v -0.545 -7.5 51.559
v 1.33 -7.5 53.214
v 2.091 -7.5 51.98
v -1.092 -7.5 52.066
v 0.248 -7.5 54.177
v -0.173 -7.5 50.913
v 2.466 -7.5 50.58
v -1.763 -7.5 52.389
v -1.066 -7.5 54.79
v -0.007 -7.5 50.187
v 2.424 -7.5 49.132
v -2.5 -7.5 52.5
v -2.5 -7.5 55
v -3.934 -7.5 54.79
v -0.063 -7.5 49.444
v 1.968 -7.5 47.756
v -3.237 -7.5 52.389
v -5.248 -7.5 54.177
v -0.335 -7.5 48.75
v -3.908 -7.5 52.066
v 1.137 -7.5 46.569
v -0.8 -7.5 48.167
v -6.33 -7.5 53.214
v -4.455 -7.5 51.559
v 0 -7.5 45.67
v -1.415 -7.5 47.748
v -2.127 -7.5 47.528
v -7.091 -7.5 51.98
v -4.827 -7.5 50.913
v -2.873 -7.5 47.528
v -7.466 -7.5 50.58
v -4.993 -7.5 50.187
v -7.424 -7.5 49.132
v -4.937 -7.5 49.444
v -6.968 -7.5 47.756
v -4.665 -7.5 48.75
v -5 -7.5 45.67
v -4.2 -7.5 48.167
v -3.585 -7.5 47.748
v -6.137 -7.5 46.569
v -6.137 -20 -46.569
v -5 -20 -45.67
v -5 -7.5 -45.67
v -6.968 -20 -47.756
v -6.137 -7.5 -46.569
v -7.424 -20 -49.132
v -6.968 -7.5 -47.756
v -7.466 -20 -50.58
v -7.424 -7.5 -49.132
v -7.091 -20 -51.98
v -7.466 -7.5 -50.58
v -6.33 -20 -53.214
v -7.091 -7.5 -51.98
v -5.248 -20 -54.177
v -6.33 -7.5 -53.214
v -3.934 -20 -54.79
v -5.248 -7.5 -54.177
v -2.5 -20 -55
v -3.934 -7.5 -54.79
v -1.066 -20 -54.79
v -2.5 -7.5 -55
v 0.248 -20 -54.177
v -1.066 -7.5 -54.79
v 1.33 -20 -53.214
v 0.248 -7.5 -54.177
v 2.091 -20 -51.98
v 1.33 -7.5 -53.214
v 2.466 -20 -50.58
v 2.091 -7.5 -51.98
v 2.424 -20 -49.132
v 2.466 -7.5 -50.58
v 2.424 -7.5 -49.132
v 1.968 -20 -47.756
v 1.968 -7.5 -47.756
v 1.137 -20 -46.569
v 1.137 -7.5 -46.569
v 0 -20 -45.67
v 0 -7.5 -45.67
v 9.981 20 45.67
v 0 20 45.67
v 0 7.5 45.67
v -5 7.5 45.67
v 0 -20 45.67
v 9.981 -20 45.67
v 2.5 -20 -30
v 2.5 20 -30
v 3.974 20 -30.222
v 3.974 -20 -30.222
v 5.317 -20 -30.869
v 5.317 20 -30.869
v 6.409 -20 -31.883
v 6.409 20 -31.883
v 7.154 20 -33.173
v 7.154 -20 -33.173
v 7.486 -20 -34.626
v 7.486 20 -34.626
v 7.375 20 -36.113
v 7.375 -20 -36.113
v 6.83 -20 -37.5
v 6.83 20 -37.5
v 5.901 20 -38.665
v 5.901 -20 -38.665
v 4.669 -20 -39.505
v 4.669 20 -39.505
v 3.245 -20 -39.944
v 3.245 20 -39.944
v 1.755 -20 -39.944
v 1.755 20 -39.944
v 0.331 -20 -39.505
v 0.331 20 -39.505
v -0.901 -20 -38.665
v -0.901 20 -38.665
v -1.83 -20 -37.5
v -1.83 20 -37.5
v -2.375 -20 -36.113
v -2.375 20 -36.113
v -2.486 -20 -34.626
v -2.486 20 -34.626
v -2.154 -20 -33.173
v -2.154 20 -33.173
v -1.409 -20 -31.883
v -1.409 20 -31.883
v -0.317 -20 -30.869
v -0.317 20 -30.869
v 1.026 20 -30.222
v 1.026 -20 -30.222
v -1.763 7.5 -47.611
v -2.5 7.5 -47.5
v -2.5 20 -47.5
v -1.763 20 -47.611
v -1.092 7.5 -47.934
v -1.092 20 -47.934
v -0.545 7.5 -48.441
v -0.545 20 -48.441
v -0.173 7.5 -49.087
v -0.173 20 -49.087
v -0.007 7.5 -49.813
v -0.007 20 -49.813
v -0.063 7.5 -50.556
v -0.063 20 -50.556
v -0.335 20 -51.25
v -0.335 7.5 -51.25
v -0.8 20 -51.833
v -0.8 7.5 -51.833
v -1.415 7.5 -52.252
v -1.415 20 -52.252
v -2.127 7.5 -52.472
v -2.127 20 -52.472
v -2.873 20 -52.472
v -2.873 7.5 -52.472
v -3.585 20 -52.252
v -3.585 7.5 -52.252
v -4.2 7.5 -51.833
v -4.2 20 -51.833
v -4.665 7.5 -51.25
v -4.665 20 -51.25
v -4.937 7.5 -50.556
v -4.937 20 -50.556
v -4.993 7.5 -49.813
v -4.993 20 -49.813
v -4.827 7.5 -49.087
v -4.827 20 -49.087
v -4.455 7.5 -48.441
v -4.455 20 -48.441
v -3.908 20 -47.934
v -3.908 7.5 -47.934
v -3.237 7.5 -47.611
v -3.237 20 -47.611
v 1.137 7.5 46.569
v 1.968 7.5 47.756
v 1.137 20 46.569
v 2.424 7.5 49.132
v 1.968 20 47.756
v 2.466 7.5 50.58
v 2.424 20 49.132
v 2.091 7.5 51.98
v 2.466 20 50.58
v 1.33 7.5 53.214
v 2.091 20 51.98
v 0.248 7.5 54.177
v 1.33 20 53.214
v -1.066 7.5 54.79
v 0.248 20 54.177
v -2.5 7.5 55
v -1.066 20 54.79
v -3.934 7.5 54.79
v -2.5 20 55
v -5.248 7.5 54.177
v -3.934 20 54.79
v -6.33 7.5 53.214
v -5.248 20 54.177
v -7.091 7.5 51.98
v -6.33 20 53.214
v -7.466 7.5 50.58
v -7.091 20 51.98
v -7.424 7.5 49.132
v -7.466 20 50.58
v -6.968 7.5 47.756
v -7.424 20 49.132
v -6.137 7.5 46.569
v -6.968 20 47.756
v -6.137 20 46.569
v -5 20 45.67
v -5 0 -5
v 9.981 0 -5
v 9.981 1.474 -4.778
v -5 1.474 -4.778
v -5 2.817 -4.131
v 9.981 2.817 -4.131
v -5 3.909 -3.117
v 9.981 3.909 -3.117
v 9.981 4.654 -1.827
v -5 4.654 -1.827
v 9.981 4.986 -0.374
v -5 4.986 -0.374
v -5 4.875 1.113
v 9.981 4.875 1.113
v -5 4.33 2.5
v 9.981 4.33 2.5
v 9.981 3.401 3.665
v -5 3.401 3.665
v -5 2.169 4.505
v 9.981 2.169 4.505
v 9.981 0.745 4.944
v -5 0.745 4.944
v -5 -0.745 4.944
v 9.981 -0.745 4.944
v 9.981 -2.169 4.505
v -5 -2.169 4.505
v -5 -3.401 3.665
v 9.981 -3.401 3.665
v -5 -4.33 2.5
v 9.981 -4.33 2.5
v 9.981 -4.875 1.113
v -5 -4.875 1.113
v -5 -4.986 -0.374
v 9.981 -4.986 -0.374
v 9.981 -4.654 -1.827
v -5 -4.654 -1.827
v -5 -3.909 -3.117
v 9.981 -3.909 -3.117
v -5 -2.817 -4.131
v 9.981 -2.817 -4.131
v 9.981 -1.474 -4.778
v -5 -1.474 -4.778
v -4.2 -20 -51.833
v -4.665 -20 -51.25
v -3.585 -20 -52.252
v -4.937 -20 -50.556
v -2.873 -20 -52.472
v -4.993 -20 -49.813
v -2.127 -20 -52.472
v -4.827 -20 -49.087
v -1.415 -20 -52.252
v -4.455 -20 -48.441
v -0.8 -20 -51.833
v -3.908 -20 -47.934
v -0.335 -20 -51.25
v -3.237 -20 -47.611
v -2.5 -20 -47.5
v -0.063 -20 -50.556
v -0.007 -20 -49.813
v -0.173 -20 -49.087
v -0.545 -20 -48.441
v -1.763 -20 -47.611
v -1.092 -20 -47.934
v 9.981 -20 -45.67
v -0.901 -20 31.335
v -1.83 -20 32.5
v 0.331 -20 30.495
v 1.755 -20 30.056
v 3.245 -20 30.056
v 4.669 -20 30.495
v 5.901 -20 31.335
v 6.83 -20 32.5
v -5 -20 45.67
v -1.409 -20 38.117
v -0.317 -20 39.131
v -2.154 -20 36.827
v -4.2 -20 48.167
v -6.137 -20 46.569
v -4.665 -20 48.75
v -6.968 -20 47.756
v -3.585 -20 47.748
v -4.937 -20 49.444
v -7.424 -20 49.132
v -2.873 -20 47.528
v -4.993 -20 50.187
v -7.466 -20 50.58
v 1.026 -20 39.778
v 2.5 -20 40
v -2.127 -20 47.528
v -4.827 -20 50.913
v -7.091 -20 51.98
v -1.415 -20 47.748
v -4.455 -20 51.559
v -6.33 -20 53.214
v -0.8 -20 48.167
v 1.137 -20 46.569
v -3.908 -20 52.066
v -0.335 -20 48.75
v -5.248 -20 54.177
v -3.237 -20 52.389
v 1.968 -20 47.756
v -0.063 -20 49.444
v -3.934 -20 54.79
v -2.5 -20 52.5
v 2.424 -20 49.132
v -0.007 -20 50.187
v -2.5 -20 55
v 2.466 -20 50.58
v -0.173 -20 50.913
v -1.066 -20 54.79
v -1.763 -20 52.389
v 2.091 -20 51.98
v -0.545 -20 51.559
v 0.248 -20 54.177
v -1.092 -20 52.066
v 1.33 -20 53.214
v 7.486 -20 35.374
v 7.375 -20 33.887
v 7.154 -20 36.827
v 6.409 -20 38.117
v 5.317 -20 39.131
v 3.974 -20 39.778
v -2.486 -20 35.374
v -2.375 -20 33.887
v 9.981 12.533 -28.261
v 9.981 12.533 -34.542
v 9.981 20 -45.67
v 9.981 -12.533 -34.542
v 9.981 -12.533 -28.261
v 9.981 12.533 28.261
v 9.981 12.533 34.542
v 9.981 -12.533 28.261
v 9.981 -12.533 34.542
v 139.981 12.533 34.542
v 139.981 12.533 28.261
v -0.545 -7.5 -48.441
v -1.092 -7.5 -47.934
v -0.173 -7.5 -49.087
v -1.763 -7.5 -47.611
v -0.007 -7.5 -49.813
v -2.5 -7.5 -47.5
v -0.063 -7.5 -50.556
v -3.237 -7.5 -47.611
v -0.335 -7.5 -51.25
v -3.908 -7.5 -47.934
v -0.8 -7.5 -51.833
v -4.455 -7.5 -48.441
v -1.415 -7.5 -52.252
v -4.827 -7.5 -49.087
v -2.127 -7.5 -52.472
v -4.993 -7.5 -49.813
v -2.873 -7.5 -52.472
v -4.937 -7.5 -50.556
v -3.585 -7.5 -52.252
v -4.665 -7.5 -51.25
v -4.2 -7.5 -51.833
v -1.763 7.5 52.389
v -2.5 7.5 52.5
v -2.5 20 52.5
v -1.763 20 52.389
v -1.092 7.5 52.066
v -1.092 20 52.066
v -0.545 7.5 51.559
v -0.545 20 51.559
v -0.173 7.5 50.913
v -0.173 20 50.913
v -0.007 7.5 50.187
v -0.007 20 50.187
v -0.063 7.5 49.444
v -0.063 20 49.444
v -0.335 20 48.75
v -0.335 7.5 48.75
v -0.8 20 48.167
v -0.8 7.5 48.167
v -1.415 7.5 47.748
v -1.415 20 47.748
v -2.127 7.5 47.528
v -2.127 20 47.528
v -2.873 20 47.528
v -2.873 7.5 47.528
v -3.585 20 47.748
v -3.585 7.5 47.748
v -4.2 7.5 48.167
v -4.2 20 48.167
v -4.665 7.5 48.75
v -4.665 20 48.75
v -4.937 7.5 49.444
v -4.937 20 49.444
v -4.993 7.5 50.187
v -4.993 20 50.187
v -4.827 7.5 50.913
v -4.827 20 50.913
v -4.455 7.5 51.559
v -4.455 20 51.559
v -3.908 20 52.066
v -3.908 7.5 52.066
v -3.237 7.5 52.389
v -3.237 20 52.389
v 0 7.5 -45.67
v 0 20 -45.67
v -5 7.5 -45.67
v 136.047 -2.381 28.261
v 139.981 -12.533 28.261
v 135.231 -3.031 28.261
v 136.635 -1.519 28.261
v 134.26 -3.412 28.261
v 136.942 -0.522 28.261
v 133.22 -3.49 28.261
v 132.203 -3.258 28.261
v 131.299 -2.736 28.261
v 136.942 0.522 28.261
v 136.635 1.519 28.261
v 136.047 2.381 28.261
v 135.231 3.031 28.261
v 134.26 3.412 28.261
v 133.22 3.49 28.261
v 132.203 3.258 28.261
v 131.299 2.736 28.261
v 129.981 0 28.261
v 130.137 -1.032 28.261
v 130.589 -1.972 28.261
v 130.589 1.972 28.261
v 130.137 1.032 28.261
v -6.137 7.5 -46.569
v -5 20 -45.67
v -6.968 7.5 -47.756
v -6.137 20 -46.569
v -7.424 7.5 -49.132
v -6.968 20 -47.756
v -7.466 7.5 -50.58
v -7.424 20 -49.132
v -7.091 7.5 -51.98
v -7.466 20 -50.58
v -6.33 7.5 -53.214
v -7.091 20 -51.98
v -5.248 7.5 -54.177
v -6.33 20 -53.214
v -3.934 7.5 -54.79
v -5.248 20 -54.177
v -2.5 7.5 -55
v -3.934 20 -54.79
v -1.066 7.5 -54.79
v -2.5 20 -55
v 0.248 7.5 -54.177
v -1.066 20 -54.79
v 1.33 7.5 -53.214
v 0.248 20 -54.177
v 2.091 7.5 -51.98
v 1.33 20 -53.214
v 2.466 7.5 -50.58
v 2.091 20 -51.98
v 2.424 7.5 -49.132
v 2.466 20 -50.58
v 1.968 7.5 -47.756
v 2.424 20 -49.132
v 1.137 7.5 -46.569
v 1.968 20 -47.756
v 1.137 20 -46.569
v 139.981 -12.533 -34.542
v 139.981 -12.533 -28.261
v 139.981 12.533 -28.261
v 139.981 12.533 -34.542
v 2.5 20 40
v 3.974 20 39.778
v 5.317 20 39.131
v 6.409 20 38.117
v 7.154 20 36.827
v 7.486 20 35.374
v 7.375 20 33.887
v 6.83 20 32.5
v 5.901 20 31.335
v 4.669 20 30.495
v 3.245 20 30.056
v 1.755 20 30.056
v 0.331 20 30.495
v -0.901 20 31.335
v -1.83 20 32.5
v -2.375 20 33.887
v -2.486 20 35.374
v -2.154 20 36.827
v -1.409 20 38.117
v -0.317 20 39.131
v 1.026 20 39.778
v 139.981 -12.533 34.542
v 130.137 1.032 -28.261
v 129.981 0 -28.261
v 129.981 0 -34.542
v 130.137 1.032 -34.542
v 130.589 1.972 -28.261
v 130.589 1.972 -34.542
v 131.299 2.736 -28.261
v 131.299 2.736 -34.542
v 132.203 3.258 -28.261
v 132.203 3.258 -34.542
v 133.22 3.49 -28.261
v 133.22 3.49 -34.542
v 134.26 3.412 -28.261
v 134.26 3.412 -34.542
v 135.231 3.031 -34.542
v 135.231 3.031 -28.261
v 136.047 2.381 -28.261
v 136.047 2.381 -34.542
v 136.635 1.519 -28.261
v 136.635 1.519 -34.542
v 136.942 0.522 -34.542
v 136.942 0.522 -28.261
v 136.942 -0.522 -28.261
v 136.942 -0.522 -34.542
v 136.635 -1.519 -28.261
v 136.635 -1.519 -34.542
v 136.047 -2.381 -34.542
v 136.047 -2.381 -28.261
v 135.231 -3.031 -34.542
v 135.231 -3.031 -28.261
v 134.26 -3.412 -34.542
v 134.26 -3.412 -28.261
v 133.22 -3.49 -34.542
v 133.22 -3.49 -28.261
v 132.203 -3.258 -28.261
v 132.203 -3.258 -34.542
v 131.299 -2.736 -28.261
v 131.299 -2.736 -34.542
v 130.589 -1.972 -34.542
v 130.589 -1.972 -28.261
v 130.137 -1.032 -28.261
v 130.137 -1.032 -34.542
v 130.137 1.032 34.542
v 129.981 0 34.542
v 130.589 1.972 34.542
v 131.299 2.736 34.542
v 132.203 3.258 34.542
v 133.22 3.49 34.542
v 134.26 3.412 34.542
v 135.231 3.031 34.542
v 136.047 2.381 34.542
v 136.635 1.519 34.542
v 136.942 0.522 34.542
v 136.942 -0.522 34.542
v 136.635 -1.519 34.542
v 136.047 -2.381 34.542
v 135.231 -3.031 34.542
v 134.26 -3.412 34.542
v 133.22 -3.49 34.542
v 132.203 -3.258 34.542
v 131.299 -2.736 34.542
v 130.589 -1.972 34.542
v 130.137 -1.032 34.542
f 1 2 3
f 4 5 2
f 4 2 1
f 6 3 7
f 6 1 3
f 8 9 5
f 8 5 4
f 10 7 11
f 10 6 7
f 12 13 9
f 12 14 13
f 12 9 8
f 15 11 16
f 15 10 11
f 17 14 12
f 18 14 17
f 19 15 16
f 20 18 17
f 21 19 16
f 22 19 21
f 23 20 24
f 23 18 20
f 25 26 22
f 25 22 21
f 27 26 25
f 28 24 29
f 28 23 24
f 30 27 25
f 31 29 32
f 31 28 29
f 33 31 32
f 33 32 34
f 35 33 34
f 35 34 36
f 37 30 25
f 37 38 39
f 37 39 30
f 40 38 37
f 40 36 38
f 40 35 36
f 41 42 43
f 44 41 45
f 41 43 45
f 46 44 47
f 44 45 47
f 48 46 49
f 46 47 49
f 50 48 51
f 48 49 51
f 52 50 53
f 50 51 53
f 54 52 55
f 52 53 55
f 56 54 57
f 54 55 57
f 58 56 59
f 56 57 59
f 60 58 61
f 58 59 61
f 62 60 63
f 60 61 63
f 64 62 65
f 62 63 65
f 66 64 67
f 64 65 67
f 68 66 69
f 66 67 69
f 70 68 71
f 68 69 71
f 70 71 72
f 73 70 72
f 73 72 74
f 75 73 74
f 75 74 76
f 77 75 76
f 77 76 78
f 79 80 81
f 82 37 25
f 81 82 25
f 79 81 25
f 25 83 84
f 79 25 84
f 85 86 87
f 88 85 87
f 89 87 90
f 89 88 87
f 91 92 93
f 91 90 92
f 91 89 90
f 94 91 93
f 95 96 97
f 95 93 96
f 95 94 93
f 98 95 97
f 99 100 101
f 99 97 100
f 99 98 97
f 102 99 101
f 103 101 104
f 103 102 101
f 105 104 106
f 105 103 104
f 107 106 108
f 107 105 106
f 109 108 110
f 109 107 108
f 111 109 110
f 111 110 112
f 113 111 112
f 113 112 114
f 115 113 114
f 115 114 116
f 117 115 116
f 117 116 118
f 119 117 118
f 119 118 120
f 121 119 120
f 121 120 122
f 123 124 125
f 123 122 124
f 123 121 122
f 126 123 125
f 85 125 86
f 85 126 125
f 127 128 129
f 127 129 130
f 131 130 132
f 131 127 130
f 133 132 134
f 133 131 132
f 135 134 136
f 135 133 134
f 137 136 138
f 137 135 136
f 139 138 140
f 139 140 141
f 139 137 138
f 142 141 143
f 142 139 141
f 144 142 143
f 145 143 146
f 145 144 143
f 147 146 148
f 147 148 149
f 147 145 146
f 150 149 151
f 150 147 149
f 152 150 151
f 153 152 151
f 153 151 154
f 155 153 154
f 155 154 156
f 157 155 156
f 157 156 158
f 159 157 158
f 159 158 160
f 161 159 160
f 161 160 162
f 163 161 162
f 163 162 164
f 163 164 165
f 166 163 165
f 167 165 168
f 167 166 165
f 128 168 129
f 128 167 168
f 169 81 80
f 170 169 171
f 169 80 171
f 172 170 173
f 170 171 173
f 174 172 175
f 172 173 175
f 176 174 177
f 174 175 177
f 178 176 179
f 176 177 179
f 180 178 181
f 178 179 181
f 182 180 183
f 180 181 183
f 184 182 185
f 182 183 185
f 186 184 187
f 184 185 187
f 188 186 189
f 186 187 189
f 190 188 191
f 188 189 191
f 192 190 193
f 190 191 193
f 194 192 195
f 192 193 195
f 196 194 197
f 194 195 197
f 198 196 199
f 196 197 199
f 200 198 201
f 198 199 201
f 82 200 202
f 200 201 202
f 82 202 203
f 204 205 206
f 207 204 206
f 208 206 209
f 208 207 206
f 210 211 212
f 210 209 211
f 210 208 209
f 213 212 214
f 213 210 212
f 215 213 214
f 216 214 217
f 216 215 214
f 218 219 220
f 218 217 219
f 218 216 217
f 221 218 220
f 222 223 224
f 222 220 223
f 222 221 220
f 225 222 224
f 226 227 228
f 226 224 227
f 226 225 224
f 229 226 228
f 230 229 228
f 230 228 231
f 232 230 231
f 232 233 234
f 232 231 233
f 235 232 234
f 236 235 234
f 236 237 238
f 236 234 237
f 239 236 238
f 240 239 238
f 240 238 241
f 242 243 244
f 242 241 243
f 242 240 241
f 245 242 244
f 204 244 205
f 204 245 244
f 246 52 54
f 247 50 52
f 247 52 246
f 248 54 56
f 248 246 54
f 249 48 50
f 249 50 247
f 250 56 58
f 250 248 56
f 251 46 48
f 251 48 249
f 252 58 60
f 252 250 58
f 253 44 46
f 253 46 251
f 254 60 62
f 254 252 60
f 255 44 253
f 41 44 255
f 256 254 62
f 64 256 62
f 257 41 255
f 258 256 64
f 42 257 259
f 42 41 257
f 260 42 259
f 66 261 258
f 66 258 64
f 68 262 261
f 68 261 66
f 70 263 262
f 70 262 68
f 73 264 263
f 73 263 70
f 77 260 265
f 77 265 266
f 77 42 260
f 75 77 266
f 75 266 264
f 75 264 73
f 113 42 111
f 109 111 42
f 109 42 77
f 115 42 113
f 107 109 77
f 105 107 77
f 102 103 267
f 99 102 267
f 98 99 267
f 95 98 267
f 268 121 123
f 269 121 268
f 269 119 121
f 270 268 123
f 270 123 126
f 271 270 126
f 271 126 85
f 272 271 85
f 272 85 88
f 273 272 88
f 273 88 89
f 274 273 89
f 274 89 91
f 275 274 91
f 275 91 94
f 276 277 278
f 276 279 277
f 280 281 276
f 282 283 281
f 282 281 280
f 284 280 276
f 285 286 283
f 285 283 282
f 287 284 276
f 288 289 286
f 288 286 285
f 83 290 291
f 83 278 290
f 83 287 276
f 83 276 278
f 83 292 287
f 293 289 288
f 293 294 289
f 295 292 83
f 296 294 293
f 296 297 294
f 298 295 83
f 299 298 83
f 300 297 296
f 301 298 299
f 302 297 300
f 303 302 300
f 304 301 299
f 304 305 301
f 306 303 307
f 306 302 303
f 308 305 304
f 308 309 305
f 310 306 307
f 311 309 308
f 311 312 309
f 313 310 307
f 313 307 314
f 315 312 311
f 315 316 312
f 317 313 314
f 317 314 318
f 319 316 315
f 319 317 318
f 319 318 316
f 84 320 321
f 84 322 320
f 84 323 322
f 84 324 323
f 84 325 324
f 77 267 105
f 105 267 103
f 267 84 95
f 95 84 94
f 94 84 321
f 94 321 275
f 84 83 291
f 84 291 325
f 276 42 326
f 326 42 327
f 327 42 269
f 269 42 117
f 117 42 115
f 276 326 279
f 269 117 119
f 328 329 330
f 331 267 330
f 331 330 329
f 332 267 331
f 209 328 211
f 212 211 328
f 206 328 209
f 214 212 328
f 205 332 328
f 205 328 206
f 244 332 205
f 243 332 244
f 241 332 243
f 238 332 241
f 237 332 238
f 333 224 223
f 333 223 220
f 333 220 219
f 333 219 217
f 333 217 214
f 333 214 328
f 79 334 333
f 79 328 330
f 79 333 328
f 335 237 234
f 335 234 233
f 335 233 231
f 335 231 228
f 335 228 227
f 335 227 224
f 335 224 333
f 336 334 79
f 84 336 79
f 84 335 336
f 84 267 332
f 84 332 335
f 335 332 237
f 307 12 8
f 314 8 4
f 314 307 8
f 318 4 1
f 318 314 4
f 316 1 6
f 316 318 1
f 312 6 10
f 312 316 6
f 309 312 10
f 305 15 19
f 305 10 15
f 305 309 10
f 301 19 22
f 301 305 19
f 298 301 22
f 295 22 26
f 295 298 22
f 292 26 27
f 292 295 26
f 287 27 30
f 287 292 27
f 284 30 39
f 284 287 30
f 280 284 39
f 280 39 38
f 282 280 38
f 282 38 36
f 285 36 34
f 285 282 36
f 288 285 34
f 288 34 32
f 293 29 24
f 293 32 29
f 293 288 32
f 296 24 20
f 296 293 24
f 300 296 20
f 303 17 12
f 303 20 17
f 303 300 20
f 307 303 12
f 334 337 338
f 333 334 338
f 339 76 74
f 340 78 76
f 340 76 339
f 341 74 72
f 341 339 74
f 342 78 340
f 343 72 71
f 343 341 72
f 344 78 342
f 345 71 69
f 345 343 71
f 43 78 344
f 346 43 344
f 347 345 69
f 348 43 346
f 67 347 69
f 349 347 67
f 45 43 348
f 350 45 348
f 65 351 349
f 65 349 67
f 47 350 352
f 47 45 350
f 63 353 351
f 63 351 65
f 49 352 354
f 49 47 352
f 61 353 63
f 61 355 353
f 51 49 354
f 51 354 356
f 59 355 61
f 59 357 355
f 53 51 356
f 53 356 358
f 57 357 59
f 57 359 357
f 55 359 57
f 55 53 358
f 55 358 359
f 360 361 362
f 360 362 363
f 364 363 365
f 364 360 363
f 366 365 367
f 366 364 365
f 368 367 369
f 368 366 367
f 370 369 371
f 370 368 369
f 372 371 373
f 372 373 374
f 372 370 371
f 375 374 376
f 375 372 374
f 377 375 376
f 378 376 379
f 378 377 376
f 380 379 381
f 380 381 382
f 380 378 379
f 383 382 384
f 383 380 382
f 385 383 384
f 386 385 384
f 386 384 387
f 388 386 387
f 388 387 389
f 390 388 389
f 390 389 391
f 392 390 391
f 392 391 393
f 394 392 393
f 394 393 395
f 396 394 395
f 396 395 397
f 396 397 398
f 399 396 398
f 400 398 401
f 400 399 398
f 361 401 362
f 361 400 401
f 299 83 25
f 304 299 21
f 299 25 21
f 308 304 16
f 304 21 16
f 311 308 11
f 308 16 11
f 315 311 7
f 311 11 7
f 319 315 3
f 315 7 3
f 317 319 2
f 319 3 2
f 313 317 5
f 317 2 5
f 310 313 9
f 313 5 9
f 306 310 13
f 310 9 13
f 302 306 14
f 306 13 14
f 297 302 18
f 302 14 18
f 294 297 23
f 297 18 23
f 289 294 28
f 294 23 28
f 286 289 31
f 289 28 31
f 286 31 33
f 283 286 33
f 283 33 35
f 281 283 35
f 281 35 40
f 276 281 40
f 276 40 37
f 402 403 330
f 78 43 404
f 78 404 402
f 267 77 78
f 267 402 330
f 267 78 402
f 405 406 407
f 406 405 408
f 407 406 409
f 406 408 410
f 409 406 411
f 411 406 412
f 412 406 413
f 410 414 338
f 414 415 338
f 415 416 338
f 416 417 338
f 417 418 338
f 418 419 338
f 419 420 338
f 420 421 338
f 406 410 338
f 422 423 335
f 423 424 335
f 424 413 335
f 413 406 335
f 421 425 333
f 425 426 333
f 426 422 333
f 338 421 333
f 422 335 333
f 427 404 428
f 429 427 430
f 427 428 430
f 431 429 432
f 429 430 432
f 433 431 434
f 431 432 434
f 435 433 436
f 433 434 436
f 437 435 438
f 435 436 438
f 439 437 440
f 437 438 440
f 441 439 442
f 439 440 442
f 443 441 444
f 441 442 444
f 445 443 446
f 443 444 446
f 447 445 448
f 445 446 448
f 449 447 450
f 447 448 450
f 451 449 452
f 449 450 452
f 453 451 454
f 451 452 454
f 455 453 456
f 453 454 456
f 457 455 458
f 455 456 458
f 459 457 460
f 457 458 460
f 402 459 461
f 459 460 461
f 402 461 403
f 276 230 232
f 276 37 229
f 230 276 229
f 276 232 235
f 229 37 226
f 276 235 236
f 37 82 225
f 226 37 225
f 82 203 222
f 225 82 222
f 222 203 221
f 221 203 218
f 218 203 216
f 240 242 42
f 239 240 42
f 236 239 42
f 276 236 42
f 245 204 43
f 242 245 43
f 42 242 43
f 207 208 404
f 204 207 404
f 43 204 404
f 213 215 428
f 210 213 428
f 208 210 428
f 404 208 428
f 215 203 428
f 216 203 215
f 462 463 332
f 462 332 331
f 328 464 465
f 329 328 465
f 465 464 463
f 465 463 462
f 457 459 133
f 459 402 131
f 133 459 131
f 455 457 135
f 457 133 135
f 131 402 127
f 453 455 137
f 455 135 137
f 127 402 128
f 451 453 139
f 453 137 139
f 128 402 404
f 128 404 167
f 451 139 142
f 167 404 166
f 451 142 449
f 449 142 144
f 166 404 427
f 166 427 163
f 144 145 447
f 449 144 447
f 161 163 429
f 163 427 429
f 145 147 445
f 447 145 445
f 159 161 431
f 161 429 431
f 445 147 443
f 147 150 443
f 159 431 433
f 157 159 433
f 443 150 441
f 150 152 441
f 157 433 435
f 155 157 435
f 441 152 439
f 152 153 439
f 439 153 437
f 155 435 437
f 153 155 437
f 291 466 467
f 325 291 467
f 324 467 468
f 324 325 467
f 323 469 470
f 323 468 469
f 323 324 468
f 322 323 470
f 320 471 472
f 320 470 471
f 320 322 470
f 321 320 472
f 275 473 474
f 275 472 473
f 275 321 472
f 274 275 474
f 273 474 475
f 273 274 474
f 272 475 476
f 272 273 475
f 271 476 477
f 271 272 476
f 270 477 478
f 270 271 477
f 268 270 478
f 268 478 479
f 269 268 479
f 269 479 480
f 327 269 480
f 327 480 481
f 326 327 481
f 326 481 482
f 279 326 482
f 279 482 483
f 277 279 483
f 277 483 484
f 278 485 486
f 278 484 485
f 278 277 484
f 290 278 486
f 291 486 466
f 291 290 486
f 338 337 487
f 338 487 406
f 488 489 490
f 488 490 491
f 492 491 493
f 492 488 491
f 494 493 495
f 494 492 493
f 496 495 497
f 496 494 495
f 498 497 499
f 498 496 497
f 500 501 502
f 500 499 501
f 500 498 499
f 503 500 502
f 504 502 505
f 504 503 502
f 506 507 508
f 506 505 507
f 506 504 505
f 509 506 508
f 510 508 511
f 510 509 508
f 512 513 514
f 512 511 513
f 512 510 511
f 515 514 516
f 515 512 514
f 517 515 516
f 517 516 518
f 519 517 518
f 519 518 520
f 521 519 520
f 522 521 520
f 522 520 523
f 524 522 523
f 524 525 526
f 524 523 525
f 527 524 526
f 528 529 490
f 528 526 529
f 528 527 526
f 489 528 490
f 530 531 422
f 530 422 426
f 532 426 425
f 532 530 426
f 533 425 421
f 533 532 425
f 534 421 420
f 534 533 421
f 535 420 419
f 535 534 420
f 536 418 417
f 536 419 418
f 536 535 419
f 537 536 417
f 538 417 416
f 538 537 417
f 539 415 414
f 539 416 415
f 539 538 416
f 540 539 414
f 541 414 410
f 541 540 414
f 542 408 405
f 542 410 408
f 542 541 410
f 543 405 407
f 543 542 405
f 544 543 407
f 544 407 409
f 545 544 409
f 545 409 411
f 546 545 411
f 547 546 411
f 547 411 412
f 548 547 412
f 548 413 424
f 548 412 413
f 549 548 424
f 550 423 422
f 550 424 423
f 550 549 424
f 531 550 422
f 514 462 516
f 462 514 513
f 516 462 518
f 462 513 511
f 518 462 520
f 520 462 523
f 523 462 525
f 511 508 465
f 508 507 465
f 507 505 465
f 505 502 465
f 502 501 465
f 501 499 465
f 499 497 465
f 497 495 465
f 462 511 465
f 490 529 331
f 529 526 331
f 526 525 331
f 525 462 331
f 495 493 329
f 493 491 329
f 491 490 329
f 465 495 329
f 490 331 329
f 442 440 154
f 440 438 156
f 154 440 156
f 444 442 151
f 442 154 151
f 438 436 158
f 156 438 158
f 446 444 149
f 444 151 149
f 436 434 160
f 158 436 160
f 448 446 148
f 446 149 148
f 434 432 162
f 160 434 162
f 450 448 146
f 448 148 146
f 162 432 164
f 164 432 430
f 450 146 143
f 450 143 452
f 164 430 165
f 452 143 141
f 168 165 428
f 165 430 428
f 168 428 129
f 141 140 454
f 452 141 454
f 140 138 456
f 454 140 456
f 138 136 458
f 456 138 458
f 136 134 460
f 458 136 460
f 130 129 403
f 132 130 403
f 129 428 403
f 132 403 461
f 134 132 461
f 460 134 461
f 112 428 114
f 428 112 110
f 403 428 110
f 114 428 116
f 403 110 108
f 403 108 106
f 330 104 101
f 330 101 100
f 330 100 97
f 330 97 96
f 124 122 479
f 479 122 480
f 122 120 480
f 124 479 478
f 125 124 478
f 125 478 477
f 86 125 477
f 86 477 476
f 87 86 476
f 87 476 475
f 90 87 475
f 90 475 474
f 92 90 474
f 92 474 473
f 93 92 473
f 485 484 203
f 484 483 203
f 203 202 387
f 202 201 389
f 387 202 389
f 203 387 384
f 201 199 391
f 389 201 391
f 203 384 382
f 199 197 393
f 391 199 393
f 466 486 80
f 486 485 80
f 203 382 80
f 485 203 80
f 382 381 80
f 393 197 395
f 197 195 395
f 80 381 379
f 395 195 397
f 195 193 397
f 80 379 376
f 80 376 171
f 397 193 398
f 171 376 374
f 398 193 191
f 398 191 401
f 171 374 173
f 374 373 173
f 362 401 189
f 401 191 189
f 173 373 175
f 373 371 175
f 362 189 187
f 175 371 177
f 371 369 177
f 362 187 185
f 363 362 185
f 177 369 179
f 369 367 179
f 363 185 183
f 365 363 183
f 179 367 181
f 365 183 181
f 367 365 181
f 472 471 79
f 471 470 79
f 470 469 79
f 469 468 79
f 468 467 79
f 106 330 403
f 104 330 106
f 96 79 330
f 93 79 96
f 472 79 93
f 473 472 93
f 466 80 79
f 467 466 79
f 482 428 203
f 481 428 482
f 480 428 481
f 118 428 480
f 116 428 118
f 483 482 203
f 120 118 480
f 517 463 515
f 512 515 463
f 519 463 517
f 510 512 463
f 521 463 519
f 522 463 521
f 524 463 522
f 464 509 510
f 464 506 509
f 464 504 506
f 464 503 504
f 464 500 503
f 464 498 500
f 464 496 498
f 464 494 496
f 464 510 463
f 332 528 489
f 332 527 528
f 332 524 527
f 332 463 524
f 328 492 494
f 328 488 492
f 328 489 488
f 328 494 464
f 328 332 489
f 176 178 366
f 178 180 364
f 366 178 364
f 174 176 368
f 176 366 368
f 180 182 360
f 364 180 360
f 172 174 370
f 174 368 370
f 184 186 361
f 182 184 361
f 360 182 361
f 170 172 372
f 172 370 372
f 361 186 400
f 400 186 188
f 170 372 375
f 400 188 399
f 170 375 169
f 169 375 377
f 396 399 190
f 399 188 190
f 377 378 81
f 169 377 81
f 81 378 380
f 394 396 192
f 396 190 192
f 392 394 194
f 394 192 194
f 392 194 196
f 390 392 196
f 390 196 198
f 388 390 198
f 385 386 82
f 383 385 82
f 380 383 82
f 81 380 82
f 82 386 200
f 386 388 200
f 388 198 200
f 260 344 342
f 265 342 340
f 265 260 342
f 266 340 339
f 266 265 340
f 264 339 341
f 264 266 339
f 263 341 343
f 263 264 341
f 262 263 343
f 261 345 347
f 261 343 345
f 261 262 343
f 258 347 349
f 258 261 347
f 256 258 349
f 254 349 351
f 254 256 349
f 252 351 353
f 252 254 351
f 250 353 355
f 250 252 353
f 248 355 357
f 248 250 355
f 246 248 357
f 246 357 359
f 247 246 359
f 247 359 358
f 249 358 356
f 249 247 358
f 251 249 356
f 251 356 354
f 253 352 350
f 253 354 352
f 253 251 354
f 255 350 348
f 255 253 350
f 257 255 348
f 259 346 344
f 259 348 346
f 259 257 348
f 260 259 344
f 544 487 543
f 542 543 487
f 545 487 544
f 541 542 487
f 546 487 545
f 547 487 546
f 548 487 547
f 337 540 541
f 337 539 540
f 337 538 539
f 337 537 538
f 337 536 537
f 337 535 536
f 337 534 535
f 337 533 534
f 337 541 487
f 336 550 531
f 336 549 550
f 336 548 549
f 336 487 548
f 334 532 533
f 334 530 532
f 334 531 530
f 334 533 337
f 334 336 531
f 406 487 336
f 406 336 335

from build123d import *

# Parameters (mm, degrees)
SKETCH2_R               = 2.5
BOSS_EXTRUDE2_DEPTH     = 20
SKETCH6_W               = 9.981195927
SKETCH6_H               = 91.339745962
BOSS_EXTRUDE3_DEPTH     = 40
CUT_EXTRUDE2_DEPTH      = 69.735902352
CUT_EXTRUDE2_DEPTH_BACK = 69.735902352
SKETCH4_R               = 5
CUT_EXTRUDE1_DEPTH      = 60.368546151
CUT_EXTRUDE1_DEPTH_BACK = 60.368546151
SKETCH3_R               = 5
SKETCH3_W               = 9.330127019
SKETCH3_H               = 15
SKETCH7_W               = 6.280786139
SKETCH7_H               = 25.065781514
BOSS_EXTRUDE4_DEPTH     = 130
CUT_EXTRUDE4_DEPTH      = 165.095031026
CUT_EXTRUDE4_DEPTH_BACK = 165.095031026
SKETCH8_R               = 3.5


with BuildPart() as part:
    # Sketch2 → Boss-Extrude2 (new, symmetric)
    with BuildSketch(Plane(origin=(0, 0, 0), x_dir=(1, 0, 0), z_dir=(0, 1, 0))):
        with BuildLine():
            Line((-5, -45.669872981), (-5, 45.669872981))
            ThreePointArc((-5, 45.669872981), (-2.5, 55), (0, 45.669872981))
            Line((0, 45.669872981), (0, -45.669872981))
            ThreePointArc((0, -45.669872981), (-2.5, -55), (-5, -45.669872981))
        make_face()
        with Locations(Location((-2.5, 50, 0), (0, 0, 270))):
            Circle(SKETCH2_R, mode=Mode.SUBTRACT)
        with Locations(Location((-2.5, -50, 0), (0, 0, 270))):
            Circle(SKETCH2_R, mode=Mode.SUBTRACT)
    extrude(amount=BOSS_EXTRUDE2_DEPTH, both=True)

    # Sketch6 → Boss-Extrude3 (add)
    with BuildSketch(Plane.XZ.offset(20)):
        with Locations((4.990597963, 0)):
            Rectangle(SKETCH6_W, SKETCH6_H)
    extrude(amount=-BOSS_EXTRUDE3_DEPTH)

    # Sketch4 → Cut-Extrude2 (cut, two sides: drawn at the far end of the back side and taken through both)
    with BuildSketch(Plane(origin=(0, 20, 0), x_dir=(1, 0, 0), z_dir=(0, 1, 0)).offset(-CUT_EXTRUDE2_DEPTH_BACK)):
        with Locations(Location((2.5, 35, 0), (0, 0, 270))):
            Circle(SKETCH4_R)
        with Locations(Location((2.5, -35, 0), (0, 0, 270))):
            Circle(SKETCH4_R)
    extrude(amount=CUT_EXTRUDE2_DEPTH + CUT_EXTRUDE2_DEPTH_BACK, mode=Mode.SUBTRACT)

    # Sketch3 → Cut-Extrude1 (cut, two sides: drawn at the far end of the back side and taken through both)
    with BuildSketch(Plane(origin=(0, 0, 0), x_dir=(0, 0, -1), z_dir=(1, 0, 0)).offset(-CUT_EXTRUDE1_DEPTH_BACK)):
        Circle(SKETCH3_R)
        with Locations((50.33493649, 0)):
            Rectangle(SKETCH3_W, SKETCH3_H)
        with Locations((-50.33493649, 0)):
            Rectangle(SKETCH3_W, SKETCH3_H)
    extrude(amount=CUT_EXTRUDE1_DEPTH + CUT_EXTRUDE1_DEPTH_BACK, mode=Mode.SUBTRACT)

    # Sketch7 → Boss-Extrude4 (add)
    with BuildSketch(Plane(origin=(9.981195927, 0, 0), x_dir=(0, 0, -1), z_dir=(1, 0, 0))):
        with Locations((-31.401692569, 0)):
            Rectangle(SKETCH7_W, SKETCH7_H)
        with Locations((31.401692569, 0)):
            Rectangle(SKETCH7_W, SKETCH7_H)
    extrude(amount=BOSS_EXTRUDE4_DEPTH)

    # Sketch8 → Cut-Extrude4 (cut, two sides: drawn at the far end of the back side and taken through both)
    with BuildSketch(Plane(origin=(0, 0, 28.2612995), x_dir=(-1, 0, 0), z_dir=(0, 0, -1)).offset(-CUT_EXTRUDE4_DEPTH_BACK)):
        with Locations((-133.481195927, 0)):
            Circle(SKETCH8_R)
    extrude(amount=CUT_EXTRUDE4_DEPTH + CUT_EXTRUDE4_DEPTH_BACK, mode=Mode.SUBTRACT)


solid = part.part
